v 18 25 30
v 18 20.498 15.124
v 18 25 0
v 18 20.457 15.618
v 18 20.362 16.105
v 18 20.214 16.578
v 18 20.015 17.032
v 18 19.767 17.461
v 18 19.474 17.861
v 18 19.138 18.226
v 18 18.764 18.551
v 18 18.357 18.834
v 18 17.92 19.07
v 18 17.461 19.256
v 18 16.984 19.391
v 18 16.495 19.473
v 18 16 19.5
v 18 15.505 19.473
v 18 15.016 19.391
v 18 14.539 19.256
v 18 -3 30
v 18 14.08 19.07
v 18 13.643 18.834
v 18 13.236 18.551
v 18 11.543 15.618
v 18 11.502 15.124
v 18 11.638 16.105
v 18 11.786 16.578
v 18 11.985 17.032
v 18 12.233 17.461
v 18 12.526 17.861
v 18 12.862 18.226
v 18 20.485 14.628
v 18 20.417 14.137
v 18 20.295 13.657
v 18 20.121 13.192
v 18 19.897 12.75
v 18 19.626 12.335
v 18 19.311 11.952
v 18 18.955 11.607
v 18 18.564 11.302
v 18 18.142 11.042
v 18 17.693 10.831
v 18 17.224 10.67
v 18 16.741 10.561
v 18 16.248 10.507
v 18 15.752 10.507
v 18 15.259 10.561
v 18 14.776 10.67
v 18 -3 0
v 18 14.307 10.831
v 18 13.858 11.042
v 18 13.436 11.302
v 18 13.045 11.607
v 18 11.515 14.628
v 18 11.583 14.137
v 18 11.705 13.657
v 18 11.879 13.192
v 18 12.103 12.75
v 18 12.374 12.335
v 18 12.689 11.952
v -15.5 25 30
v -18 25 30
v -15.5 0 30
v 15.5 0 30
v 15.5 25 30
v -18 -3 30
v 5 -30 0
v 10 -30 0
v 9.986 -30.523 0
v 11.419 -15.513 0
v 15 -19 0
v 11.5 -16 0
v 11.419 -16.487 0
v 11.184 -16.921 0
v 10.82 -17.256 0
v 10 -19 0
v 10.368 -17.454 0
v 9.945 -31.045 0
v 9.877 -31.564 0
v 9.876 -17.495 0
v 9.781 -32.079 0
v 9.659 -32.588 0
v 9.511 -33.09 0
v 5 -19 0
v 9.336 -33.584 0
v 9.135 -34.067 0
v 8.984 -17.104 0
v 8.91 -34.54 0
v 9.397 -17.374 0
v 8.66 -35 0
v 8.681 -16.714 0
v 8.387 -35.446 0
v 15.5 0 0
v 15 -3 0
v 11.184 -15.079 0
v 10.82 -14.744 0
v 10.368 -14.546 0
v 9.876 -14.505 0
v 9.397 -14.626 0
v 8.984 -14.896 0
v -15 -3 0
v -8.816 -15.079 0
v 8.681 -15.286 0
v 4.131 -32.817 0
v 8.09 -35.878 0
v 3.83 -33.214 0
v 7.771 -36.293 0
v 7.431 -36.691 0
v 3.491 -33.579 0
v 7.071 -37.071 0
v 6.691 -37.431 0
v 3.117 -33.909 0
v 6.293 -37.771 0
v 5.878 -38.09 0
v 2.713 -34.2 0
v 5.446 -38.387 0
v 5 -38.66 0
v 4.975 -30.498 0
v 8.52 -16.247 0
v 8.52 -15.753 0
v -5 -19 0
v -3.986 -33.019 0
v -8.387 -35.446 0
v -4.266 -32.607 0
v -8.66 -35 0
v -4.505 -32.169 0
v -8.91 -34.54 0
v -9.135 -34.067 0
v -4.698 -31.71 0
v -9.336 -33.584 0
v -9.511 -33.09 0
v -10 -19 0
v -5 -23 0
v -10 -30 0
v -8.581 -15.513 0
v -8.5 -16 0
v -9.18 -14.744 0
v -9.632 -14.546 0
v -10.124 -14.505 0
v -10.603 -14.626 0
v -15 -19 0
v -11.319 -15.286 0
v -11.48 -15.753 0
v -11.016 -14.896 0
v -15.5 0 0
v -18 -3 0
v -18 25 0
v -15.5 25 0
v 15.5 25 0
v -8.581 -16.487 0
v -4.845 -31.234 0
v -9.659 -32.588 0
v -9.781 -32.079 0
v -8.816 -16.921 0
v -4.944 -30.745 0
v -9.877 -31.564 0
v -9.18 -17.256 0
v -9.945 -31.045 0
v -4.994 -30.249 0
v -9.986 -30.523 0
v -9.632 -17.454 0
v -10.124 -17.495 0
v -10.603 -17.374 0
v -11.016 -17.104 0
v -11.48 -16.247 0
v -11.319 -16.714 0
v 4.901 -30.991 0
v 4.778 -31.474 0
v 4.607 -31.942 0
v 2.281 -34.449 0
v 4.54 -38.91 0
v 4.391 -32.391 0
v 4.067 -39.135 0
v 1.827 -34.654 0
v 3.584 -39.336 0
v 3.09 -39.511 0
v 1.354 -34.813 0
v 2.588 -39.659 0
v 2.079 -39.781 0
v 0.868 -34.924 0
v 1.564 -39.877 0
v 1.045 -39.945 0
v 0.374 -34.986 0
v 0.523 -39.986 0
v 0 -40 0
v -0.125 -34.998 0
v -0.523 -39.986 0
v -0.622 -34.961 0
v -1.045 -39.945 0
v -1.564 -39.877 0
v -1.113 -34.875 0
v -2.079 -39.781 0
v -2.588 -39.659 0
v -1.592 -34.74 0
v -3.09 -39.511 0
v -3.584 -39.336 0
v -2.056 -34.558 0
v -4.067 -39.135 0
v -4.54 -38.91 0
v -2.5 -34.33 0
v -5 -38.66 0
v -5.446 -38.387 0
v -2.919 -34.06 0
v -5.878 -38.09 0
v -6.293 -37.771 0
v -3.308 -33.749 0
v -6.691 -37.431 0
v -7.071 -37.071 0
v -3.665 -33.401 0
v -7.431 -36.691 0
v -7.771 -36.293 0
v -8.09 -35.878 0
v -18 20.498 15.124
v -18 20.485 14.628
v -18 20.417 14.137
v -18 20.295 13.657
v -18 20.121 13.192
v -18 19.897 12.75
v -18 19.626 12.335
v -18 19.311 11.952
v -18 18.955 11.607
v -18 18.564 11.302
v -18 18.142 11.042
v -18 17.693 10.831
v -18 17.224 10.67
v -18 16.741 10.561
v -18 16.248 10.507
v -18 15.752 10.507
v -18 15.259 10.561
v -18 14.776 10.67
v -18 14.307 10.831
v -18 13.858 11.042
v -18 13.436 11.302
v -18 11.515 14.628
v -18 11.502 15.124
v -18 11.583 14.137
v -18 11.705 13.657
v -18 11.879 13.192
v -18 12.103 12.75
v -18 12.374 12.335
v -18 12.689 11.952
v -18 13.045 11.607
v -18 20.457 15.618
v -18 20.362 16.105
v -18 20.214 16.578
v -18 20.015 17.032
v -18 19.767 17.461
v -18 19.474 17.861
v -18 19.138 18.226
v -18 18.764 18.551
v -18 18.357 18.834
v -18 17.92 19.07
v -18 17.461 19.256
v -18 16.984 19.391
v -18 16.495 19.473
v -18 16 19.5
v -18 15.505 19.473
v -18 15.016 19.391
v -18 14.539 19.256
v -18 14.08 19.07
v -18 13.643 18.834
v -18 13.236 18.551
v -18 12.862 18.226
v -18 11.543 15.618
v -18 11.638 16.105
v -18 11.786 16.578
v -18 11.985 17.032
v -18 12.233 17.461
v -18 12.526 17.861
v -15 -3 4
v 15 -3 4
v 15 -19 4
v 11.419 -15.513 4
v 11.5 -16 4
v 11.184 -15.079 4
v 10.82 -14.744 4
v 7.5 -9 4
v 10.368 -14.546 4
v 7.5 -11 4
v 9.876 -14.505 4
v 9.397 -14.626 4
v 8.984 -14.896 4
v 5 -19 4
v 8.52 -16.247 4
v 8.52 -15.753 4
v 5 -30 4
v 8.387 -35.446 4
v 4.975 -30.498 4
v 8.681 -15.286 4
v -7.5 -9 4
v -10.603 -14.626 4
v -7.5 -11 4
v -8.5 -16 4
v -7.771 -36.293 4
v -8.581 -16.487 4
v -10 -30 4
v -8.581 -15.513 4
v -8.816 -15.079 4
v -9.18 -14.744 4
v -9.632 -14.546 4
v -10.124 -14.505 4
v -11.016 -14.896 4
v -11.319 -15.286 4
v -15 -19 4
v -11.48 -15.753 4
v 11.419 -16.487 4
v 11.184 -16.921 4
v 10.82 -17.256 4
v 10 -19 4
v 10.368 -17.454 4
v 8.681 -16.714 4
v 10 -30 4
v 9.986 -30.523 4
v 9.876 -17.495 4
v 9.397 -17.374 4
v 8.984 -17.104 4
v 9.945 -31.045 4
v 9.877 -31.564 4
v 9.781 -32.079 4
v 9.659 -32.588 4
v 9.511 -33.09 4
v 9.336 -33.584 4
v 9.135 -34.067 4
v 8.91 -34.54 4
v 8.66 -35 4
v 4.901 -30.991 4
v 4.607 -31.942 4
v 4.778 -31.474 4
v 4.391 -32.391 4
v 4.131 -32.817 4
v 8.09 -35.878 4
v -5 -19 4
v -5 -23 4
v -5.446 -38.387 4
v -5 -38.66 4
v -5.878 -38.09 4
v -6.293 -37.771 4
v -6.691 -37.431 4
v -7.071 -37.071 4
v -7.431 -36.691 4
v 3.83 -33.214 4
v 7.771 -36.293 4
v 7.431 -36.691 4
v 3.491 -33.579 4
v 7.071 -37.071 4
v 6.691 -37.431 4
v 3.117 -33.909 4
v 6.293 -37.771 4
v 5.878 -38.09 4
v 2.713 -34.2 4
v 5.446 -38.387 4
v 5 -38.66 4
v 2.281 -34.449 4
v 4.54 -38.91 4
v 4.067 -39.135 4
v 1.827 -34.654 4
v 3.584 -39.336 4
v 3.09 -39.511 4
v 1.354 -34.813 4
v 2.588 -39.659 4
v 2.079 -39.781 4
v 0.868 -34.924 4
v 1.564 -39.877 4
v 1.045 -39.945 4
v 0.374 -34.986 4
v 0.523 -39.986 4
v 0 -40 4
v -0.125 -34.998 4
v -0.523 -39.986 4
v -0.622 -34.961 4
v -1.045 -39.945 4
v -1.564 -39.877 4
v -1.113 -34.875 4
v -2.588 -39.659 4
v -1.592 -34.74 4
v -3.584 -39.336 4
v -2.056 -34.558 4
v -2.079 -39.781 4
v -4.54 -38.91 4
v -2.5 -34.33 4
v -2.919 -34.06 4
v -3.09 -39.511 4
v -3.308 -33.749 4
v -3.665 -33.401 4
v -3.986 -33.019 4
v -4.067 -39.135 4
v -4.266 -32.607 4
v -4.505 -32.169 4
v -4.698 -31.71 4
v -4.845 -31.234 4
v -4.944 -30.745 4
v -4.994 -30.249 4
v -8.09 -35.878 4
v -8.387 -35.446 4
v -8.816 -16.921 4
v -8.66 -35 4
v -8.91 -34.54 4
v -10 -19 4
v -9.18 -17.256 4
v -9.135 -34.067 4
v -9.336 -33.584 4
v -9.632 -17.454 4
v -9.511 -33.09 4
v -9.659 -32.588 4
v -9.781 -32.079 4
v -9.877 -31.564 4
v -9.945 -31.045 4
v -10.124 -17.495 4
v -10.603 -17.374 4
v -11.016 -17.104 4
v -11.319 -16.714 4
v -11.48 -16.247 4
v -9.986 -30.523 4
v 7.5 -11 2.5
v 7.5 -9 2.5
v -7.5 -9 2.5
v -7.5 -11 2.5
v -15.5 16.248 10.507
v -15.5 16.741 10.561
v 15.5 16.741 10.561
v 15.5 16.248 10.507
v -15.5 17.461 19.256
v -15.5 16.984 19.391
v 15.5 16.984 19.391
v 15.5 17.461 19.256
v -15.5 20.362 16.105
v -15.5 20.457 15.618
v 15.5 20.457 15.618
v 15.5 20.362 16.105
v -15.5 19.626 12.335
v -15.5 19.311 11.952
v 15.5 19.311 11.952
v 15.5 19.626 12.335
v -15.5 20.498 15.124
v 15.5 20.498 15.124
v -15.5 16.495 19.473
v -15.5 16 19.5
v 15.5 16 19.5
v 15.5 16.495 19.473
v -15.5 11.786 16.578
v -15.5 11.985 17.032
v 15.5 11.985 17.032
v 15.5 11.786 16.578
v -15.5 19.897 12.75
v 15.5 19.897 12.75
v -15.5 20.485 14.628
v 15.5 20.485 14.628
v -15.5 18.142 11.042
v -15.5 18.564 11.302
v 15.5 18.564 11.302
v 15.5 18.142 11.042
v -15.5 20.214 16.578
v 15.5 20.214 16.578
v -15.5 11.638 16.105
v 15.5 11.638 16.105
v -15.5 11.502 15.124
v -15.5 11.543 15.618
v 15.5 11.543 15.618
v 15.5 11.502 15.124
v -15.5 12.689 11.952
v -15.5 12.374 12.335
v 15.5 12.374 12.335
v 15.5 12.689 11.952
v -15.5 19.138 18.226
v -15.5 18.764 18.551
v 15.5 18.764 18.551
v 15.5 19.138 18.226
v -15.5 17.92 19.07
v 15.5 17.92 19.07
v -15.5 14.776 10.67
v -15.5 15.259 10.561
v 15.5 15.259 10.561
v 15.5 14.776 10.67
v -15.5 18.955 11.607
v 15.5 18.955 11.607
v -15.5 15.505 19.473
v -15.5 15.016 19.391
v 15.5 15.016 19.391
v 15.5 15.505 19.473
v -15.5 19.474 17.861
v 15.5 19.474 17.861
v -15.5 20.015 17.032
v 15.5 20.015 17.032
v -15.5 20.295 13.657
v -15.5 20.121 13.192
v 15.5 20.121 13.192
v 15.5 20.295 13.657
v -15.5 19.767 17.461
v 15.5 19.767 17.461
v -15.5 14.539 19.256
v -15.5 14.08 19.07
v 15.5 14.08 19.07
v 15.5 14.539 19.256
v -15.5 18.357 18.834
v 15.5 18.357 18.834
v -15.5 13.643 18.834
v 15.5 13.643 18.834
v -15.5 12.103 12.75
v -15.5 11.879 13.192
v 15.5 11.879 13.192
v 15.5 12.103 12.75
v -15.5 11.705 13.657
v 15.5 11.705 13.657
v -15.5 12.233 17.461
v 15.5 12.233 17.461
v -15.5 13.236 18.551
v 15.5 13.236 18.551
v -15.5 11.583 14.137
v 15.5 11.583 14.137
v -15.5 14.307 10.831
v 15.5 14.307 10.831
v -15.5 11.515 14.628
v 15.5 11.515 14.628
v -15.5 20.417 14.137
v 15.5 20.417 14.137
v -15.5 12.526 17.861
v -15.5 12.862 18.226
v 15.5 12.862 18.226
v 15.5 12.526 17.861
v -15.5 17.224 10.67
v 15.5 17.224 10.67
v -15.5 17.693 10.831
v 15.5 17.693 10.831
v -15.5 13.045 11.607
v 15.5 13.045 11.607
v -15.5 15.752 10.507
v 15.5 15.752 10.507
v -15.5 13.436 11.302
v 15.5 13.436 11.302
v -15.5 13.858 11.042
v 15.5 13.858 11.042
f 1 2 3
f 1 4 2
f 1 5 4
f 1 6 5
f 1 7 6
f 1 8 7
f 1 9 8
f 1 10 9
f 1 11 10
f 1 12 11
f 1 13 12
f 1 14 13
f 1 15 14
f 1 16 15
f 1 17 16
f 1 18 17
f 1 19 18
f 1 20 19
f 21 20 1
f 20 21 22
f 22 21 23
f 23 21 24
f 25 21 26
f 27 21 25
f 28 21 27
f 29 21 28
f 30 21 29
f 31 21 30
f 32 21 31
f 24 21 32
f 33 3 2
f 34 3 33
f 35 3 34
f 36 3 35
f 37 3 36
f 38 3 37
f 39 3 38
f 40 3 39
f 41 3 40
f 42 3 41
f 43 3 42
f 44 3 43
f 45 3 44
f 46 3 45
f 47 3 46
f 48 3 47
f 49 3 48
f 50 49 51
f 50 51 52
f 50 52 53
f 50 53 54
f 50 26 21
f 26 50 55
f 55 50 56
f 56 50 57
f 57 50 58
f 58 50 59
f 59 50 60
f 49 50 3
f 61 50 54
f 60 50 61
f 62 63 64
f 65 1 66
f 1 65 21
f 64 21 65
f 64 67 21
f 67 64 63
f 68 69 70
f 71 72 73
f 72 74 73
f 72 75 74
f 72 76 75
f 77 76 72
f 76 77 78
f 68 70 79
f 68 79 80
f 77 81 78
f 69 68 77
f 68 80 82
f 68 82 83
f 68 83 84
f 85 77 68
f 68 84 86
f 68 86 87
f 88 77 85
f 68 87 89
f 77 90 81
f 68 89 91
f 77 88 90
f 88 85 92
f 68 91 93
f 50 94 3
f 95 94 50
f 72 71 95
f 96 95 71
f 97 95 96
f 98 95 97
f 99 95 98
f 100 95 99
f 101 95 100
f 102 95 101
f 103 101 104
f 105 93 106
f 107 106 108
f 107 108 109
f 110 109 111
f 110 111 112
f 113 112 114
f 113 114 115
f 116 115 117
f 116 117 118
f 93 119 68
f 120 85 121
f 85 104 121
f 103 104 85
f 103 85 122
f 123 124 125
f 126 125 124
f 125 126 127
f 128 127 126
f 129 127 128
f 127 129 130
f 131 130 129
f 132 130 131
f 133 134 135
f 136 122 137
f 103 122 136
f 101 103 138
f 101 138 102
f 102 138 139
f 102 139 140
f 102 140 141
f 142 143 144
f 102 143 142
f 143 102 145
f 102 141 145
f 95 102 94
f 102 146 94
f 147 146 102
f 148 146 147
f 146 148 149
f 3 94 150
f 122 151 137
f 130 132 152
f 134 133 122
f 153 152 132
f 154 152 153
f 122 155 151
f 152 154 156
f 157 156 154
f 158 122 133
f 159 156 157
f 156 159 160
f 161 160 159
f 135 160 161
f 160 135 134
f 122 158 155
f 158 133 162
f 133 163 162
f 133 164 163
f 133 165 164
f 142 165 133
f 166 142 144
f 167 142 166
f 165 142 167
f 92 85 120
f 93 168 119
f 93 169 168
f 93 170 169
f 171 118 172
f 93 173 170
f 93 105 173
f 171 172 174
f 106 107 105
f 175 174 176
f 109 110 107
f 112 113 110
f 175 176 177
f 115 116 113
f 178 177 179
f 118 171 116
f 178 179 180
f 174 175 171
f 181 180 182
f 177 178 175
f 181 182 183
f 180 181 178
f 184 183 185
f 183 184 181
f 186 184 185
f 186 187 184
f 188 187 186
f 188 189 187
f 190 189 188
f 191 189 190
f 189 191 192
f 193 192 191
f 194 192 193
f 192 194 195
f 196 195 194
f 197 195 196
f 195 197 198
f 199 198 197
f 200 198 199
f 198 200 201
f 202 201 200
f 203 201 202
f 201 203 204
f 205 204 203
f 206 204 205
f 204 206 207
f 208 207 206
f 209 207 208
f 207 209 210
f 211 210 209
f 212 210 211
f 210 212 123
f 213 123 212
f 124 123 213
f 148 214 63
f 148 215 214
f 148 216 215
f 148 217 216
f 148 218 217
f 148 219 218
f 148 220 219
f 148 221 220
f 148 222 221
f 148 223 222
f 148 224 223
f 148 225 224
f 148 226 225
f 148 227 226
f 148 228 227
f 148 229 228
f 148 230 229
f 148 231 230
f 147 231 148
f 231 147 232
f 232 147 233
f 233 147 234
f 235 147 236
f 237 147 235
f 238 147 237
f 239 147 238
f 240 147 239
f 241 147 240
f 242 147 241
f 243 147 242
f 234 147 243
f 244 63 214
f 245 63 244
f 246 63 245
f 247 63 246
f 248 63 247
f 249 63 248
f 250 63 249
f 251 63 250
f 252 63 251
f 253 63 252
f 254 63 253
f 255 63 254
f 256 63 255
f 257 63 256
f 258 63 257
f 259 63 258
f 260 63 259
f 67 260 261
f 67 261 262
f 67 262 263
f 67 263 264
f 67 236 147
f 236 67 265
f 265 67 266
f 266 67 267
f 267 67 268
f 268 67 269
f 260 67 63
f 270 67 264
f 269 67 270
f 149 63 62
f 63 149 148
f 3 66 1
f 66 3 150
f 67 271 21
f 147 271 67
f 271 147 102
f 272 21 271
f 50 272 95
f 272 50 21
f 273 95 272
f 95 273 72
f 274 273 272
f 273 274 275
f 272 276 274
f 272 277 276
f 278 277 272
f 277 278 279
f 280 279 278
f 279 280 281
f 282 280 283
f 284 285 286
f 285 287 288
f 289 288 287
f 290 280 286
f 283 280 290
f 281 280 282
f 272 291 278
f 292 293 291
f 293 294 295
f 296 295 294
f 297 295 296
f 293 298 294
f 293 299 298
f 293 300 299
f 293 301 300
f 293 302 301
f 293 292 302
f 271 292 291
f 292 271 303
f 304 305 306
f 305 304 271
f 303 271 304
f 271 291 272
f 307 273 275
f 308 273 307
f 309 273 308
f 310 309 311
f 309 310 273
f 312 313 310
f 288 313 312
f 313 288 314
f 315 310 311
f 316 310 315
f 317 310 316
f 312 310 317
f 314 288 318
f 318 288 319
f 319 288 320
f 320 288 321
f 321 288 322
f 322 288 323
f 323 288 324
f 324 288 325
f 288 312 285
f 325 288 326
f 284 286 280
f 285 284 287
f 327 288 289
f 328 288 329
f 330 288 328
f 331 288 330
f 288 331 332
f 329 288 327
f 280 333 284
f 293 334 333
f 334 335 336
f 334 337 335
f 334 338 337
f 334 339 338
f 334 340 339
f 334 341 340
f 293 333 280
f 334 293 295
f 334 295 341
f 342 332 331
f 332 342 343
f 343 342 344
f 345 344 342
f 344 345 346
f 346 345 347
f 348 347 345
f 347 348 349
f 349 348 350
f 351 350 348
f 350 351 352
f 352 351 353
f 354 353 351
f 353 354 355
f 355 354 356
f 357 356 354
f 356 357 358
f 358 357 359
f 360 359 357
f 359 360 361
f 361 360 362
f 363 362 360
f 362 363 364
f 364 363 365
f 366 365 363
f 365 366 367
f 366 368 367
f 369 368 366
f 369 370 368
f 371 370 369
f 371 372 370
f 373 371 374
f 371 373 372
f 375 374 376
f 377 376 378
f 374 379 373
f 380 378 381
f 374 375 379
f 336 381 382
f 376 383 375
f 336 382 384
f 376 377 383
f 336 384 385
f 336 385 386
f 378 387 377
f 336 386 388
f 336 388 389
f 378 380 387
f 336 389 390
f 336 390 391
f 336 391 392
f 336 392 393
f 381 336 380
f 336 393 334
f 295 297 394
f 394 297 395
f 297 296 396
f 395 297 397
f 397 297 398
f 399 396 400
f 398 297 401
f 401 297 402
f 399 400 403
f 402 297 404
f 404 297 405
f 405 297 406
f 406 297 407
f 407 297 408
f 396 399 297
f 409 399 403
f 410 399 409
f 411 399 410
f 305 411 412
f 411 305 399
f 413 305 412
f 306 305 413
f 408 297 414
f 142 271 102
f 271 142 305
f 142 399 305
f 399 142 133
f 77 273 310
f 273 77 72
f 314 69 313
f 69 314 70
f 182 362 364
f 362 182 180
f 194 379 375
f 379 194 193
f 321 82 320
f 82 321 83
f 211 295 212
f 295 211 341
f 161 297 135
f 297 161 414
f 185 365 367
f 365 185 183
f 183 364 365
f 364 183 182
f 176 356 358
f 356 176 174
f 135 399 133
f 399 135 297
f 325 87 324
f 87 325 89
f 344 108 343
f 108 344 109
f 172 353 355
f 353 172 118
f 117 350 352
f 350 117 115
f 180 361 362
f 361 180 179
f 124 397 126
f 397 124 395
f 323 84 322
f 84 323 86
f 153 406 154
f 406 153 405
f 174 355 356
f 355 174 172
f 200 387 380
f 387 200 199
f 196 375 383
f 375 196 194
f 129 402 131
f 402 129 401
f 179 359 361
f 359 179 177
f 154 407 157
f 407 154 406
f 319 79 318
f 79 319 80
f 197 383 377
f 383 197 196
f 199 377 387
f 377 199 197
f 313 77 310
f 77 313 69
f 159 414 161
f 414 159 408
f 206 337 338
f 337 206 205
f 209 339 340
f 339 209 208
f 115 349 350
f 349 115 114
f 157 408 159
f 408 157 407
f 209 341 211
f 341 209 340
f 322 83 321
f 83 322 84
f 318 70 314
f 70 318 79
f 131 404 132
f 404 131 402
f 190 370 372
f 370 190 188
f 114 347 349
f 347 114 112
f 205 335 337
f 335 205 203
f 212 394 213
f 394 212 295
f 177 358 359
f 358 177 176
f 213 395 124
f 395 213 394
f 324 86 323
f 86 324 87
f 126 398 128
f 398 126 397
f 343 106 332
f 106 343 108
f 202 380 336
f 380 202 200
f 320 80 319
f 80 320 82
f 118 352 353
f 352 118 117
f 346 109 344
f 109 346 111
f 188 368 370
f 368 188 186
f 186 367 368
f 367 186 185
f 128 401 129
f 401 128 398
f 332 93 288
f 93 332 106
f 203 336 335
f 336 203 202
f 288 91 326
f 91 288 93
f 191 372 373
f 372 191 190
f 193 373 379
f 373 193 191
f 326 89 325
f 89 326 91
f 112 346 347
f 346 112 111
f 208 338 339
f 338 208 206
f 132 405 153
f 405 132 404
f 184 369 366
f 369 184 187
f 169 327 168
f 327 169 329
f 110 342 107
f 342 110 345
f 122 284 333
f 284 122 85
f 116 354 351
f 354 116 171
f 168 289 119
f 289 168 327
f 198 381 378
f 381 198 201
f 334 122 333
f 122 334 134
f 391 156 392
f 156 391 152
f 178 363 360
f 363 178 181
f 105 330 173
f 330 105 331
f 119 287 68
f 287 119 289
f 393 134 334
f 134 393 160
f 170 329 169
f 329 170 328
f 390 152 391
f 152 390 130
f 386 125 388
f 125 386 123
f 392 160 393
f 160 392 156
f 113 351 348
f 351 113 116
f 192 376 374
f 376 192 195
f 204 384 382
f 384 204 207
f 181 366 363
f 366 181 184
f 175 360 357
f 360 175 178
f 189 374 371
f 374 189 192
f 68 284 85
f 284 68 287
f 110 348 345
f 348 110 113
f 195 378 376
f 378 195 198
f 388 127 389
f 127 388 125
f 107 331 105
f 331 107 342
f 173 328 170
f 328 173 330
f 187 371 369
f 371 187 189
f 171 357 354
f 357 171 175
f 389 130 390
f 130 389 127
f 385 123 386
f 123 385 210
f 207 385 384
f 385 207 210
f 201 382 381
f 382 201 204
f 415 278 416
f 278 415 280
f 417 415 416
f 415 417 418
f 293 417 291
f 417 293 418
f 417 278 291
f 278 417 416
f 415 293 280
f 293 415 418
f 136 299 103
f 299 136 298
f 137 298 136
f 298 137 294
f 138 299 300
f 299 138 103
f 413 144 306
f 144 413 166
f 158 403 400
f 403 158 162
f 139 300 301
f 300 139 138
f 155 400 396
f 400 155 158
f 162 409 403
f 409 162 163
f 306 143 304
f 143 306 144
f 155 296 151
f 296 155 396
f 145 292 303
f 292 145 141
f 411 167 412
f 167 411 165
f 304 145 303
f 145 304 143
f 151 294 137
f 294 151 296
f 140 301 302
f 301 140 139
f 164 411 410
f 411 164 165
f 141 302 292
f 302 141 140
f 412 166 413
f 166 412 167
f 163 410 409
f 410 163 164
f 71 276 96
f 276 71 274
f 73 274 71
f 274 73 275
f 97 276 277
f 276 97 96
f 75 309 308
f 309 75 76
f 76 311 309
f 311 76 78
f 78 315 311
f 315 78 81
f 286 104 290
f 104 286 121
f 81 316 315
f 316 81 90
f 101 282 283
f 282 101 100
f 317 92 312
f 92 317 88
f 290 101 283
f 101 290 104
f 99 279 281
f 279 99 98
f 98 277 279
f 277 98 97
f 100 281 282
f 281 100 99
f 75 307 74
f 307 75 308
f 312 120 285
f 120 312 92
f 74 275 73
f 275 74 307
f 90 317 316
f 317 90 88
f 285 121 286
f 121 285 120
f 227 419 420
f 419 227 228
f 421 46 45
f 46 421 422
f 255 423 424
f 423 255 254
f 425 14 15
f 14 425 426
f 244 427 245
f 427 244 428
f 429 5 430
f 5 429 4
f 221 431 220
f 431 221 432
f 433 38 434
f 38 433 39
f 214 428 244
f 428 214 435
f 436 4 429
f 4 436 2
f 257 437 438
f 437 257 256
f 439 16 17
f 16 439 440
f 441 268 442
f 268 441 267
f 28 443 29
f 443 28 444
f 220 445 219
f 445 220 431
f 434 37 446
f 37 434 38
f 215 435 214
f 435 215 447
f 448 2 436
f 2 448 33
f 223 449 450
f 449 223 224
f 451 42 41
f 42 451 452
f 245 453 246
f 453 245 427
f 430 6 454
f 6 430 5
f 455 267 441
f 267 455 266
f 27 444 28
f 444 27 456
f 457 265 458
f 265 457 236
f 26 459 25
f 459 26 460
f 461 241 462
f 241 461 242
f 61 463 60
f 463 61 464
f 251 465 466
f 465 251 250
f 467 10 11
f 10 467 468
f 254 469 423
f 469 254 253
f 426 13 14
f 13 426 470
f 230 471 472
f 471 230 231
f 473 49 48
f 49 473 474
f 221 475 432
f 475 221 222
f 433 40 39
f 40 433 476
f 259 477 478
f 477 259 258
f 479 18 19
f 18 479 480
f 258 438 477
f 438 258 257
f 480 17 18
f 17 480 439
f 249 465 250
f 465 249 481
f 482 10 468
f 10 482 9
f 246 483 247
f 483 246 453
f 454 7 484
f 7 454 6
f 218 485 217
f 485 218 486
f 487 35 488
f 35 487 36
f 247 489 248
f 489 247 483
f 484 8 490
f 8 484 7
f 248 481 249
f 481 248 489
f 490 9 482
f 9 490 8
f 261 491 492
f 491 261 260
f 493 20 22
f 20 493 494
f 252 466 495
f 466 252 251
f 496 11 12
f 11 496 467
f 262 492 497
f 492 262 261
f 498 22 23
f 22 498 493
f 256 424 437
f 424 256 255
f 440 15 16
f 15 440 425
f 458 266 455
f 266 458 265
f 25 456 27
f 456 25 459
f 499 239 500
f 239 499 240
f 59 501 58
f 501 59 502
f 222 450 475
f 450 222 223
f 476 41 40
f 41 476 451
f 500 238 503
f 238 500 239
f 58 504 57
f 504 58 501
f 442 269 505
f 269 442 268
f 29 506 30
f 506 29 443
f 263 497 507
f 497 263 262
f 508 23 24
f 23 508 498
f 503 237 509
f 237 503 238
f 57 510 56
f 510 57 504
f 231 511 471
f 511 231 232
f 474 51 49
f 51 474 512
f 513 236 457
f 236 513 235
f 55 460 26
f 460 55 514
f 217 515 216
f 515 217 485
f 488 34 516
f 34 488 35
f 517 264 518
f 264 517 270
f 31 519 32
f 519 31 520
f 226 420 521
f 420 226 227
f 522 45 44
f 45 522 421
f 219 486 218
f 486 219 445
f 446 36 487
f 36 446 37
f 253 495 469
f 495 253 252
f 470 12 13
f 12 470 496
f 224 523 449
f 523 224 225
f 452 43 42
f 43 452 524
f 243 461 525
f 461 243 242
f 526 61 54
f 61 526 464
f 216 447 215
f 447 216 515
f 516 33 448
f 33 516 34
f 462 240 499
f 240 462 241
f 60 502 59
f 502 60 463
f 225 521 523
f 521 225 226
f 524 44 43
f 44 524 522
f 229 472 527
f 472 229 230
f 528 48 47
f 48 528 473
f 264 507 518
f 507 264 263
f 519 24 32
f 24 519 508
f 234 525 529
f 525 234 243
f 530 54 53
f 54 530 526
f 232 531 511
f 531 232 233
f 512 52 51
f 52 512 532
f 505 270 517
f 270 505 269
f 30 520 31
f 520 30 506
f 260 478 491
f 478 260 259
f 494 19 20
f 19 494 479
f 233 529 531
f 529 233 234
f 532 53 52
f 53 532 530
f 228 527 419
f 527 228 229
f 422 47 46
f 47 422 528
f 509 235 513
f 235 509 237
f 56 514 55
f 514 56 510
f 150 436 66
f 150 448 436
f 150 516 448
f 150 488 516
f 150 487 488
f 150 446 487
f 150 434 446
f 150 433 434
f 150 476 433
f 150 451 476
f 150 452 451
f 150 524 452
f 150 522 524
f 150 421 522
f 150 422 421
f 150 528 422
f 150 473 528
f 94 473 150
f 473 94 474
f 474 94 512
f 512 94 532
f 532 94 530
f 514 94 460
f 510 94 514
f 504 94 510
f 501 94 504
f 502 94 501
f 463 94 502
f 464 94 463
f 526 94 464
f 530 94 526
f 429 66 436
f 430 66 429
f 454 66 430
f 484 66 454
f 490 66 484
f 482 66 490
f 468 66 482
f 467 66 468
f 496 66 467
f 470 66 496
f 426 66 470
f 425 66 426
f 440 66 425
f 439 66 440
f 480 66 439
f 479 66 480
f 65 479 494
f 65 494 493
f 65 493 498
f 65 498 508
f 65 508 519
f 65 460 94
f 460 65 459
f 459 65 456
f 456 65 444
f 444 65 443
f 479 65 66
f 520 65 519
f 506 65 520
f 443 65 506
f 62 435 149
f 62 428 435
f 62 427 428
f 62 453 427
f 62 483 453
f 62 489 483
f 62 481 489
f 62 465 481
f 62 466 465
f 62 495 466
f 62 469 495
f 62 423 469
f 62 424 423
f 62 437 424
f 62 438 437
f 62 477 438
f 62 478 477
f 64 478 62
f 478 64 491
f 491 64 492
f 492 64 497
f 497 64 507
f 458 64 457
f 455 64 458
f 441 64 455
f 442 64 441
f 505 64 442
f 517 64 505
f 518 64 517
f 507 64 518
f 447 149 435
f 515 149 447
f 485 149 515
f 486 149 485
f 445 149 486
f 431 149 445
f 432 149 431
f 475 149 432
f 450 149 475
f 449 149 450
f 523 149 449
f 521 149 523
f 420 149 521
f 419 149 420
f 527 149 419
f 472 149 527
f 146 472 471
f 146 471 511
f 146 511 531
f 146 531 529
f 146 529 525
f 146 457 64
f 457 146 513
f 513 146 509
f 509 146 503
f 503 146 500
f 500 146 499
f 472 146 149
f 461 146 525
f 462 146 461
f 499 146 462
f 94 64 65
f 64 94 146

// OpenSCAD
$fs=$fs/4;
$fa=$fa/4;

e=4;
h=30;

difference(){
    union(){
        translate([-18, -3,  0])cube([36,28,30]);
 
        translate([-15,  -15-e, 0])cube([30,15+e,e]);
        hull(){
            translate([-10,  -e, 0])cube([20,e,e]);
            translate([0, -h,  0]) cylinder(r=10, e);
        }
    }
    
    hull(){
        translate([-5, -15-2*e,  0])cube([10,e,e]);
        translate([0,  -h, -1]) cylinder(r=5, e+2);
    }
    translate([0, -6-e,  e])cube([15,2,3], true);
    translate([-10,  -e-12, -1]) cylinder(r=1.5, e+2);
    translate([ 10,  -e-12, -1]) cylinder(r=1.5, e+2);
    
    translate([ 0, 16, 15]) rotate([0,-90,0])cylinder(r=4.5, 40, center= true);
    translate([-15.5,  0, -1])cube([31,40, 33]);
 
}
